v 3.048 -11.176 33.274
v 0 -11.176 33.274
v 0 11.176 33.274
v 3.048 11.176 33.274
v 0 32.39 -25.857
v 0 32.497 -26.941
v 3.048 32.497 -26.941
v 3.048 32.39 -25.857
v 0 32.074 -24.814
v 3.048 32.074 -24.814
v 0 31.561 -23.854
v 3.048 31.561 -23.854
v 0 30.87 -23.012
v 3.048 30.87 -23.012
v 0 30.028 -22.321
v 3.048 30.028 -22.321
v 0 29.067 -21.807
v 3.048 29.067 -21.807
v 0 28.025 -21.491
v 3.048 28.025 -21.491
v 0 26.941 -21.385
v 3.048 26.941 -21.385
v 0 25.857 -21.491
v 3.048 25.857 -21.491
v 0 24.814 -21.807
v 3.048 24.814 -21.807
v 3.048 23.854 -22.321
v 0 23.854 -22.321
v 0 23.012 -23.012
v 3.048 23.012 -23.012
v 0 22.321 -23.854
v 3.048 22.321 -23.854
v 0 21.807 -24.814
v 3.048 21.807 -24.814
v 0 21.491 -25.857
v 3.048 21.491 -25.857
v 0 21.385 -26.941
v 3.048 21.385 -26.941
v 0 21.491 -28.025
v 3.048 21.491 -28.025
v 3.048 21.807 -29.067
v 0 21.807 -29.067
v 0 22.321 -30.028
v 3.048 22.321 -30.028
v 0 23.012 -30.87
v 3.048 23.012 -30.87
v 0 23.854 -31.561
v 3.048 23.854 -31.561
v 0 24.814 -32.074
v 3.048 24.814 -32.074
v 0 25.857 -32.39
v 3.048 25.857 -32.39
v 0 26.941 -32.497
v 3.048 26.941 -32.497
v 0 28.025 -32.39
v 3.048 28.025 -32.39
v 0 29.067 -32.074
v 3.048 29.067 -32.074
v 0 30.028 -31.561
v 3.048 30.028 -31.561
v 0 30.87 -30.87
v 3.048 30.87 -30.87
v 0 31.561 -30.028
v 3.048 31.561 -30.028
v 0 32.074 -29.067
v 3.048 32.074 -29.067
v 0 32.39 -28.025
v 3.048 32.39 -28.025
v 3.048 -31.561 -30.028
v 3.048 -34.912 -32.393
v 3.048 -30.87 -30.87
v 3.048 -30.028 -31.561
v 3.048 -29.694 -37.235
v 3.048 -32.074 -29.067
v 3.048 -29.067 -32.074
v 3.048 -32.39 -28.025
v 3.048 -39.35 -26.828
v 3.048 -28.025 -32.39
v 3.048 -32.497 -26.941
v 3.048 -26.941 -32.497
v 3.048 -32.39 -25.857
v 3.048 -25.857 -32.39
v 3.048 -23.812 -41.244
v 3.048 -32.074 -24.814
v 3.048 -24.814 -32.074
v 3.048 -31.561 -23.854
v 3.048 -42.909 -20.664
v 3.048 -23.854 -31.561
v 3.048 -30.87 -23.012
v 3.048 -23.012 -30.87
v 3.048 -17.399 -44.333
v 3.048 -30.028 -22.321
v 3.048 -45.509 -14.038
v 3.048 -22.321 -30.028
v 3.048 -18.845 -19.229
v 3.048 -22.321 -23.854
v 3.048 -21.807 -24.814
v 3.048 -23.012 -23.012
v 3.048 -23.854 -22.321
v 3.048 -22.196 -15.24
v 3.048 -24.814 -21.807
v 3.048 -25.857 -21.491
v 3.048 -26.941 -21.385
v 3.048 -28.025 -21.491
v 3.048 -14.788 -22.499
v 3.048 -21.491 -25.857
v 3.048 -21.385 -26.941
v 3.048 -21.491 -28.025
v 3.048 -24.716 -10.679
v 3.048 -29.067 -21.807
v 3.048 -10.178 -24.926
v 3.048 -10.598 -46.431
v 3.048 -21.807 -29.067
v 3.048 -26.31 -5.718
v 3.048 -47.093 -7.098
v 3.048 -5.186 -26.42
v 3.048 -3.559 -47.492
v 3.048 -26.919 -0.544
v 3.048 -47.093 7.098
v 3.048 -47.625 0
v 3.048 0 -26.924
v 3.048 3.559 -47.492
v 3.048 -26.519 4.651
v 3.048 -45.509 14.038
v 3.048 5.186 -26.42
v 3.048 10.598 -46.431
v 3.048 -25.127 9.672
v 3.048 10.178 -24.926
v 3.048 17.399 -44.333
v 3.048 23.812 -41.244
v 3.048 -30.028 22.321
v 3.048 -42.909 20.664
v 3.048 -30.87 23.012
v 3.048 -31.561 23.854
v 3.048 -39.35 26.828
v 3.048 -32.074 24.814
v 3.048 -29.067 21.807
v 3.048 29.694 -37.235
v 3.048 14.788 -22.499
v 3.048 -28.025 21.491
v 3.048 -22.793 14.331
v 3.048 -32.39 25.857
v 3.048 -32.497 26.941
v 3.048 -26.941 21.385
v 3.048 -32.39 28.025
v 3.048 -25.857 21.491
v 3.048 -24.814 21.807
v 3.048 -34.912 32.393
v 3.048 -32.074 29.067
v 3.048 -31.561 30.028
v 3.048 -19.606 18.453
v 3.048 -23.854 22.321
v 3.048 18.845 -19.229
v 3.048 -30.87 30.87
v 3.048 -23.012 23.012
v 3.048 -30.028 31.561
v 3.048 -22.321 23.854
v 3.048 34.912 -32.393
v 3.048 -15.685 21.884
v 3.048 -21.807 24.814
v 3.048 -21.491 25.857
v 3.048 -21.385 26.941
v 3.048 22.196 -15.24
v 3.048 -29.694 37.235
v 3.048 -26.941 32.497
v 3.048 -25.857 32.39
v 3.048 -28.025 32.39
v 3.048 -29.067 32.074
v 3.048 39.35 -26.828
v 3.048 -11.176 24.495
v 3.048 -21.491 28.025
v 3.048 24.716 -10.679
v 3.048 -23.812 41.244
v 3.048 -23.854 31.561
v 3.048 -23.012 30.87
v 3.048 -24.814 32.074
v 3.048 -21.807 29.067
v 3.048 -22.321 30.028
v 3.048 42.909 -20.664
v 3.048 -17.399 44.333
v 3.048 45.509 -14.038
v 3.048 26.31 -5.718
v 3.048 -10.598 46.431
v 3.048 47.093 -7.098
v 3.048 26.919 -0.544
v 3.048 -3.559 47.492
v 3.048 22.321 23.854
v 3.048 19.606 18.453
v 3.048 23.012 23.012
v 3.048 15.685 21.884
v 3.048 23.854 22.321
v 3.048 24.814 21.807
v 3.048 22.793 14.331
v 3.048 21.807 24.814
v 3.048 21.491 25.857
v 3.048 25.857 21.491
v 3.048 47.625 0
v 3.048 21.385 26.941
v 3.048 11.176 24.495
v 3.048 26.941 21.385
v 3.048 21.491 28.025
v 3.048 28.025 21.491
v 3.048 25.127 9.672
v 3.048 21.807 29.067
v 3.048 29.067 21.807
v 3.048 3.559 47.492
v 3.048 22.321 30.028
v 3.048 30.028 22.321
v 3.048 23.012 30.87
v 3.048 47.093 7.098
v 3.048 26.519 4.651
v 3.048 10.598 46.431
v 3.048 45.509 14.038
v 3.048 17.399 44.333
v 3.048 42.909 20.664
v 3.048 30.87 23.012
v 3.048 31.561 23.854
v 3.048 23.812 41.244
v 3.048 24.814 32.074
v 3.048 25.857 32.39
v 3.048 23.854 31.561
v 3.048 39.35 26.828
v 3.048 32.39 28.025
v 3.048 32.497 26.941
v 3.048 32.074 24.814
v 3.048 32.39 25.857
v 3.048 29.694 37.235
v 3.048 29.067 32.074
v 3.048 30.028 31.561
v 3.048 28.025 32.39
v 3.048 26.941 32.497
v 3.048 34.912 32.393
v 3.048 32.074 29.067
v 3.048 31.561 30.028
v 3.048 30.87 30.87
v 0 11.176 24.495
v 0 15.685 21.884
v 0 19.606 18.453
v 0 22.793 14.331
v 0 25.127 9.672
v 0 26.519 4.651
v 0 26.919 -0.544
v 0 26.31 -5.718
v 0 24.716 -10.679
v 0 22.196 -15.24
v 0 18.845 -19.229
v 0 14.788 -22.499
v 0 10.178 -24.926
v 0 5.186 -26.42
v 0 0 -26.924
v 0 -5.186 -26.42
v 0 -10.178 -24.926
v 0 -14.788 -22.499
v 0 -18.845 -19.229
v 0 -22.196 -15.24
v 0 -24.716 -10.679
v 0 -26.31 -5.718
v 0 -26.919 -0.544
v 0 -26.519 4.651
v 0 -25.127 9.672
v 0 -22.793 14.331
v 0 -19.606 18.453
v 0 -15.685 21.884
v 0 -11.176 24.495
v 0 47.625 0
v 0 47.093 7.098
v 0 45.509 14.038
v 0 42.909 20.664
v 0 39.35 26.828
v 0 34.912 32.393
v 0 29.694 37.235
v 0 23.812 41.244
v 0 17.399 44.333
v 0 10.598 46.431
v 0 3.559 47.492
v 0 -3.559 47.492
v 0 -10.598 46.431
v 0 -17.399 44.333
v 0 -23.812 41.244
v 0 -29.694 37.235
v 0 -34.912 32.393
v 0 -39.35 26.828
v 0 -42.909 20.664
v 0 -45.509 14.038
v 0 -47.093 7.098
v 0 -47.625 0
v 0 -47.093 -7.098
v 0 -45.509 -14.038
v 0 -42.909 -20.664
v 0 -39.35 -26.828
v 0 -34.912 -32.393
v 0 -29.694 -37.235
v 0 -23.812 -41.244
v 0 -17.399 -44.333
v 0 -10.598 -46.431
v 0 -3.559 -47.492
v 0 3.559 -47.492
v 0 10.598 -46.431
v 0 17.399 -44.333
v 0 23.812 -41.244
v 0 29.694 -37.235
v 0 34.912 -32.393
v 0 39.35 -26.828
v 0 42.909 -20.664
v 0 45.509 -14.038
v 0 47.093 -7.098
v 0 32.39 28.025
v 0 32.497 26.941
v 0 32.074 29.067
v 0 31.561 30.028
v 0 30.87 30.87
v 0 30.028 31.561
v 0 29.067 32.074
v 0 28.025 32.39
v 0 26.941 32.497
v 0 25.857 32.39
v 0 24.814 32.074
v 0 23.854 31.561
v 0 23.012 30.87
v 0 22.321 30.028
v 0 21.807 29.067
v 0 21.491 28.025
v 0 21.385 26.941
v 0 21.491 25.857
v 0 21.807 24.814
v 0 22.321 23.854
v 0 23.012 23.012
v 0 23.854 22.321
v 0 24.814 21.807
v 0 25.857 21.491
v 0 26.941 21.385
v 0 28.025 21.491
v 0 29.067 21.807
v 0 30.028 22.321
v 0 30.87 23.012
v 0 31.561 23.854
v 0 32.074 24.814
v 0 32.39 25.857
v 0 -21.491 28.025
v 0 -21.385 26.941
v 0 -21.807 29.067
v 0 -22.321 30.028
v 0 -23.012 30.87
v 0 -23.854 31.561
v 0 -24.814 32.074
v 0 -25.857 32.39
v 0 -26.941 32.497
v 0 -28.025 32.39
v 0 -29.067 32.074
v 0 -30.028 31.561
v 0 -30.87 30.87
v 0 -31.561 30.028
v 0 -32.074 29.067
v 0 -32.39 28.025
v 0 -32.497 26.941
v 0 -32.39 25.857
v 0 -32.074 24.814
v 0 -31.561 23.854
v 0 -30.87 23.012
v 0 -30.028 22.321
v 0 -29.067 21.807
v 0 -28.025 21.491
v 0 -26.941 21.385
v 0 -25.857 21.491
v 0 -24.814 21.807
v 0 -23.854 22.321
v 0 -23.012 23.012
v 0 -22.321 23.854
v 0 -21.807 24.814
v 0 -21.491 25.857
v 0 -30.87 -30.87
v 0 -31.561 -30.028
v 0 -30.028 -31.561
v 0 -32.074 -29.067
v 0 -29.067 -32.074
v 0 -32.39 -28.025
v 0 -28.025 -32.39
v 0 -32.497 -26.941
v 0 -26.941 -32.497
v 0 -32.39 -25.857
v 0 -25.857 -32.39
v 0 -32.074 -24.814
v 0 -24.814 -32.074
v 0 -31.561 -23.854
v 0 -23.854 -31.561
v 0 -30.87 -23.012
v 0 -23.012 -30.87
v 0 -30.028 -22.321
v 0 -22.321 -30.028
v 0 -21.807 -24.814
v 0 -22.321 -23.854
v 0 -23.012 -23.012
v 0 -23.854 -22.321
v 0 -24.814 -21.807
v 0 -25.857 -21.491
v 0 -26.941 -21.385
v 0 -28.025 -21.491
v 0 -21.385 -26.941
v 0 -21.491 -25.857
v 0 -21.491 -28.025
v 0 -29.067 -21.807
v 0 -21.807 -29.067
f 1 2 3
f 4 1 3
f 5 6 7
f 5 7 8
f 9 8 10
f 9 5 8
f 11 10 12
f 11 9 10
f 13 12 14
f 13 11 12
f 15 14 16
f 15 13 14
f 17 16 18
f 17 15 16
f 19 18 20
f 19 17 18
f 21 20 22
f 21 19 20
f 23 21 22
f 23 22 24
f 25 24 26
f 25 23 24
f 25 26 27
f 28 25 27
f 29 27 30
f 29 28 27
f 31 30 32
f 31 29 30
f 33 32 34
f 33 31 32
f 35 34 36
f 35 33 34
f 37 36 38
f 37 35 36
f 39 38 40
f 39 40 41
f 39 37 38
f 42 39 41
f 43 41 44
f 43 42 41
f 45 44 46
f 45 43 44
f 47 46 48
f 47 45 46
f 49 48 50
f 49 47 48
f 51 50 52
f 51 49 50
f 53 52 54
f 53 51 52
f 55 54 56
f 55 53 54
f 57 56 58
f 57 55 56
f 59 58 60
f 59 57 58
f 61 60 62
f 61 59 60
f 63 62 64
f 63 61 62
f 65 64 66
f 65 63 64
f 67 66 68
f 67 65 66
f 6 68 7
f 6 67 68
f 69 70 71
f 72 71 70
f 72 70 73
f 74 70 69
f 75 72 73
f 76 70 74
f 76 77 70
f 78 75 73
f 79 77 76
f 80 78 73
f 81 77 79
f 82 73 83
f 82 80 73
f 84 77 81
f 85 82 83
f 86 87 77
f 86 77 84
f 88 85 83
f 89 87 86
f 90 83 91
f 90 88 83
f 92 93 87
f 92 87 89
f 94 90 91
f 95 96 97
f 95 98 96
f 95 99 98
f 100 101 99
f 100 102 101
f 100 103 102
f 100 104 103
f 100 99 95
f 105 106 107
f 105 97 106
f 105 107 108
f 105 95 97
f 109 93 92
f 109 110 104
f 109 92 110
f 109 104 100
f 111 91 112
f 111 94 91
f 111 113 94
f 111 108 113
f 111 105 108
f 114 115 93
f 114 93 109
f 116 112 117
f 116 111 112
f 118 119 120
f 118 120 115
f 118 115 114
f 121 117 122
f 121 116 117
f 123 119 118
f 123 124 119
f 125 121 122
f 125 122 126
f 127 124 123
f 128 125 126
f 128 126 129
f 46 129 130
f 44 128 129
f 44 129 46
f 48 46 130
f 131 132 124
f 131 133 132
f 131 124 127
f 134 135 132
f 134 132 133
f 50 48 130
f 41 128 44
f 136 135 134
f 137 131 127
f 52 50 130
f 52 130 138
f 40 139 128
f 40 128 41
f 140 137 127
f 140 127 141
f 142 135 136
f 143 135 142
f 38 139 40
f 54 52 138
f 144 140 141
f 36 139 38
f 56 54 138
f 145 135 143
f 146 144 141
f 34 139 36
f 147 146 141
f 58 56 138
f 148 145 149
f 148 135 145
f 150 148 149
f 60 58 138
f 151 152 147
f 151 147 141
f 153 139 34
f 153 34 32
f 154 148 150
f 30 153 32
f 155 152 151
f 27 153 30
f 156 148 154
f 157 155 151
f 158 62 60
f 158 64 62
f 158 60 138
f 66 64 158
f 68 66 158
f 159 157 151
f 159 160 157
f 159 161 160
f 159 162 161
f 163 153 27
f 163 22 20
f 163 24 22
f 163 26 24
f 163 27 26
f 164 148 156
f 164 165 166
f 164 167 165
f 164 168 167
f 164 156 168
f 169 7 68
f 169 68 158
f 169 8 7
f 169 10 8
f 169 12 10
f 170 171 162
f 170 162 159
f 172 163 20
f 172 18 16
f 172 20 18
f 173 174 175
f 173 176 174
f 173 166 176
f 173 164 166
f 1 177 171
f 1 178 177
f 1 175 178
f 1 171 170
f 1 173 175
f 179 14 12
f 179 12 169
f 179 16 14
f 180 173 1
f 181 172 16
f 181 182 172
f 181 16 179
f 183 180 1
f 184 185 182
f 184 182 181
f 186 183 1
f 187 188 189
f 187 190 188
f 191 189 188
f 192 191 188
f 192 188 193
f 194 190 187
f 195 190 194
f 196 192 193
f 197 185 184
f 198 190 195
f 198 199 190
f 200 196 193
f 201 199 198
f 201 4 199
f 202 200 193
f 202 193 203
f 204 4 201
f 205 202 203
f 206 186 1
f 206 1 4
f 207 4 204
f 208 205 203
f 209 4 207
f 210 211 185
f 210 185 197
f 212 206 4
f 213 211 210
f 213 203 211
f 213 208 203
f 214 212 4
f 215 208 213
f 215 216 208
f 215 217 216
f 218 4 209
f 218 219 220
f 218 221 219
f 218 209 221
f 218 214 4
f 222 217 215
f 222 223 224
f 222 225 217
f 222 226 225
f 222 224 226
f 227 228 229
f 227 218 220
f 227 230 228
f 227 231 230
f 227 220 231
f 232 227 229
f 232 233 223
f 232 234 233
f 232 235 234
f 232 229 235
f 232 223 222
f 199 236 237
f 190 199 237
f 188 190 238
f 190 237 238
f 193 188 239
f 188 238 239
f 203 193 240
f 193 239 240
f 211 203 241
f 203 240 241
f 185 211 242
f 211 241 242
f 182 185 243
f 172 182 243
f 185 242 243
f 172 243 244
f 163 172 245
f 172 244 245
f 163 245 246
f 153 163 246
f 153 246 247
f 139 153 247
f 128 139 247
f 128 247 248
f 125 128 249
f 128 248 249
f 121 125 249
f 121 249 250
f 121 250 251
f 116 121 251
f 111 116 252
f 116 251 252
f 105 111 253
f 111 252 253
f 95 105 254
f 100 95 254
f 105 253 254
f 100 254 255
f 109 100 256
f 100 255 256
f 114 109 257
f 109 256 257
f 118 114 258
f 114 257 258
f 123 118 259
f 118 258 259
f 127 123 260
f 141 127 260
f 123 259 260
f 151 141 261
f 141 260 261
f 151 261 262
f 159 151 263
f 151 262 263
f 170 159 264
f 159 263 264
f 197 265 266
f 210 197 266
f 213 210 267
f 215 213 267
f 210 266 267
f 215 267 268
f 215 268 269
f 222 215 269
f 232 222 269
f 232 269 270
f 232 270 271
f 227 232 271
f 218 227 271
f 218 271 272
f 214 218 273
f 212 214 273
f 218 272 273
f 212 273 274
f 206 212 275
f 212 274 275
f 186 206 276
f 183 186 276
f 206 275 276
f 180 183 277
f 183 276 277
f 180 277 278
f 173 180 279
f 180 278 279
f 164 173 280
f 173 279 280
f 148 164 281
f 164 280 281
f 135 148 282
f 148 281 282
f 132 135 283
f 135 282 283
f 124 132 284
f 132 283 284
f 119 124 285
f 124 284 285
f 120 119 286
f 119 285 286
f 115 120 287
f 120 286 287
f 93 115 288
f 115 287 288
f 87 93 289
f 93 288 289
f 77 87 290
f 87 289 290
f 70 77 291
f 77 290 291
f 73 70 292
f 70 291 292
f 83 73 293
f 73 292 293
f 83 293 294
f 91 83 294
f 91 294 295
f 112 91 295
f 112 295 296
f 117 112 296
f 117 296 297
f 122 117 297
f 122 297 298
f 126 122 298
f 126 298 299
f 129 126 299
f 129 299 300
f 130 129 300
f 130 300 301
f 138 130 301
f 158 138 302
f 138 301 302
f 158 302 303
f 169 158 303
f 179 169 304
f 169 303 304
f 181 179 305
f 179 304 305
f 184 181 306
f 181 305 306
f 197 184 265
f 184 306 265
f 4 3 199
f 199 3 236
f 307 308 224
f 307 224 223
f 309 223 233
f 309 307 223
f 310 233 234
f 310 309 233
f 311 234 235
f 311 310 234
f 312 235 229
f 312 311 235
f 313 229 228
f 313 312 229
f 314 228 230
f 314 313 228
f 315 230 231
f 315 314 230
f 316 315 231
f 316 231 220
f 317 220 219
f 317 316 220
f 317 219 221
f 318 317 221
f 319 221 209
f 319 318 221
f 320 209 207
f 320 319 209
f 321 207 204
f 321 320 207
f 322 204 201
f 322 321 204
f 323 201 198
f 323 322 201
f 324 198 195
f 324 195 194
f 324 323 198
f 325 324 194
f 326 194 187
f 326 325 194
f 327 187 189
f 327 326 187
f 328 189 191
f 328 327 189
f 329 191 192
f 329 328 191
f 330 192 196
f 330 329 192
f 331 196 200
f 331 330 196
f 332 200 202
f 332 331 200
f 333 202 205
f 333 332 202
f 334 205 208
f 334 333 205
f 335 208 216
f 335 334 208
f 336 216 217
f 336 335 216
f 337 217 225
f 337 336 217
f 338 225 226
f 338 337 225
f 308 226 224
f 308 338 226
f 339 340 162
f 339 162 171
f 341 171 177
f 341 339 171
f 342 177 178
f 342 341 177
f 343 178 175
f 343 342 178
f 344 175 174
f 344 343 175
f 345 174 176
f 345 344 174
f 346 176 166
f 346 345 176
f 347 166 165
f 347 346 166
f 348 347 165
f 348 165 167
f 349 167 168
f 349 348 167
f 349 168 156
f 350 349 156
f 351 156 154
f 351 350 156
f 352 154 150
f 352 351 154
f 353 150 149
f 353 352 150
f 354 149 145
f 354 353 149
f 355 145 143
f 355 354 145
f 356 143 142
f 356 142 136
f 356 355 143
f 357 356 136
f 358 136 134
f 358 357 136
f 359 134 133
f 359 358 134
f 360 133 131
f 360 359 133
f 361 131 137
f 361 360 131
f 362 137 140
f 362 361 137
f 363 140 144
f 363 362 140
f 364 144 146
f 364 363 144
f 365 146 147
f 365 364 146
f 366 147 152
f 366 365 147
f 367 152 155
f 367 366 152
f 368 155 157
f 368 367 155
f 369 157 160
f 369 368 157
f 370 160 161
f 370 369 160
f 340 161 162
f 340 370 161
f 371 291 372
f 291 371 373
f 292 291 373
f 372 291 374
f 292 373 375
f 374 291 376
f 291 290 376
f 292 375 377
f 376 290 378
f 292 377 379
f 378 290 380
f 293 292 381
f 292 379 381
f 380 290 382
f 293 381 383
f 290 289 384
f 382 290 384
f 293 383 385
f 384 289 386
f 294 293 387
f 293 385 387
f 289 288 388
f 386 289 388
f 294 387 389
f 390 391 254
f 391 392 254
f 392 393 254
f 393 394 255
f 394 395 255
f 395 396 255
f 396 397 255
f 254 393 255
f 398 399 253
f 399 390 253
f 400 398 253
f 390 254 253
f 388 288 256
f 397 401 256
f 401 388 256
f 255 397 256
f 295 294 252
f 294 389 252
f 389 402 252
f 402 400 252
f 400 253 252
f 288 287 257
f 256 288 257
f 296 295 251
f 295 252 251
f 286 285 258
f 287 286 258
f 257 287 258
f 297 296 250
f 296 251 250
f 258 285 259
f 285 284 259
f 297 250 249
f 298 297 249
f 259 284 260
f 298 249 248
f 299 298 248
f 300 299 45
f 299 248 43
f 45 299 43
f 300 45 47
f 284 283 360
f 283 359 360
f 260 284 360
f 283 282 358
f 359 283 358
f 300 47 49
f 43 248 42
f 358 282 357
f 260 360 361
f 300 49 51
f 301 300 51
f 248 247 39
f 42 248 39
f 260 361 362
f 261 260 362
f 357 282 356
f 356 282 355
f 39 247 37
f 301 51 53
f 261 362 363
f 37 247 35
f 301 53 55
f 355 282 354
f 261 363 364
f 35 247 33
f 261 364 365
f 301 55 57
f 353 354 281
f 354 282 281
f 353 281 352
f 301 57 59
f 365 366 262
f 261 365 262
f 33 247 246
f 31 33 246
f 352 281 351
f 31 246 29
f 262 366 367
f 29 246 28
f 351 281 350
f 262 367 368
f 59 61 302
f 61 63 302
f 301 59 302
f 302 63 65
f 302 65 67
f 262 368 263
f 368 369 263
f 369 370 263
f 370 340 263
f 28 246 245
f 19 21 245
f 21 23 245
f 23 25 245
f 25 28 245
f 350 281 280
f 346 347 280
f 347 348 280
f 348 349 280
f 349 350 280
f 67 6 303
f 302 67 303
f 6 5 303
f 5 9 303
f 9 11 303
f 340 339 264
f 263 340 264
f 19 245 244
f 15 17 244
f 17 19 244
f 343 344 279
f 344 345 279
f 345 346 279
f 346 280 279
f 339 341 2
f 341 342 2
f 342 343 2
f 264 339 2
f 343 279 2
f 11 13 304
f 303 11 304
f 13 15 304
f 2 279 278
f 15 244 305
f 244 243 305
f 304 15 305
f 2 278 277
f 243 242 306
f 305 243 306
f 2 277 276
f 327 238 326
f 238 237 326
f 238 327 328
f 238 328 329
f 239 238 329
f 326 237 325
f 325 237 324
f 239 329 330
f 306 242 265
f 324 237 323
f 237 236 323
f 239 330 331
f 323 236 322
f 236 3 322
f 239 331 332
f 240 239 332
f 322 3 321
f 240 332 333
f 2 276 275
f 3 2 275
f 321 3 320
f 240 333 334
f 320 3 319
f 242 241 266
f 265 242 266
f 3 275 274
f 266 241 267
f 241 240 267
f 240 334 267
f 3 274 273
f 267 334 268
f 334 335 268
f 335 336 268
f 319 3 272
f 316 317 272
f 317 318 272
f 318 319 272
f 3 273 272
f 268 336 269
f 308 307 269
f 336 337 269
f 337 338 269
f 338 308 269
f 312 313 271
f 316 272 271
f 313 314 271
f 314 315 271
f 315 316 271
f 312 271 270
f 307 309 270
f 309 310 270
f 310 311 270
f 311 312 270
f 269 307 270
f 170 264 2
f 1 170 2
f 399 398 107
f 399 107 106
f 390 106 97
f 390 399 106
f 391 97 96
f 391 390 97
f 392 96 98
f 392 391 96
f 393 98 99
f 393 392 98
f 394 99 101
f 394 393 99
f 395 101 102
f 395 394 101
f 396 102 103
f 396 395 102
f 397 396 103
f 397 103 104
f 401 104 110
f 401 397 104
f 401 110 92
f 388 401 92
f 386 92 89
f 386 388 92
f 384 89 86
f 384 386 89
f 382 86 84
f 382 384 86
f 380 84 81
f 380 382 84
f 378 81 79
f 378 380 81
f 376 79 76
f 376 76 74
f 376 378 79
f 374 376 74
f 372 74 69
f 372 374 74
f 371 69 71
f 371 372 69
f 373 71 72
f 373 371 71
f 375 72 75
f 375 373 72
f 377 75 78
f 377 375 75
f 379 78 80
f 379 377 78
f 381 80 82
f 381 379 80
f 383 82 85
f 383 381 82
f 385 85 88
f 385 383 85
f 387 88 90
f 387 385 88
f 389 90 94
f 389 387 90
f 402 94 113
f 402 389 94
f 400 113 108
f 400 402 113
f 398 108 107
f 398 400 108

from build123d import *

# Parameters (mm, degrees)
F0_R     = 47.625
F0_R_2   = 5.55625
F1_DEPTH = 3.048


with BuildPart() as f1:
    # F0 (on Right) → F1 (new body)
    with BuildSketch(Plane.YZ):
        Circle(F0_R)
        with Locations((-26.9407683632, -26.9407683632)):
            Circle(F0_R_2, mode=Mode.SUBTRACT)
        with Locations((26.9407683632, -26.9407683632)):
            Circle(F0_R_2, mode=Mode.SUBTRACT)
        with Locations((-26.9407683632, 26.9407683632)):
            Circle(F0_R_2, mode=Mode.SUBTRACT)
        with BuildLine():
            ThreePointArc((11.176, 24.4948729329), (0, -26.924), (-11.176, 24.4948729329))
            Line((-11.176, 24.4948729329), (-11.176, 33.274))
            Line((-11.176, 33.274), (11.176, 33.274))
            Line((11.176, 33.274), (11.176, 24.4948729329))
        make_face(mode=Mode.SUBTRACT)
        with Locations((26.9407683632, 26.9407683632)):
            Circle(F0_R_2, mode=Mode.SUBTRACT)
    extrude(amount=F1_DEPTH)


solid = f1.part
